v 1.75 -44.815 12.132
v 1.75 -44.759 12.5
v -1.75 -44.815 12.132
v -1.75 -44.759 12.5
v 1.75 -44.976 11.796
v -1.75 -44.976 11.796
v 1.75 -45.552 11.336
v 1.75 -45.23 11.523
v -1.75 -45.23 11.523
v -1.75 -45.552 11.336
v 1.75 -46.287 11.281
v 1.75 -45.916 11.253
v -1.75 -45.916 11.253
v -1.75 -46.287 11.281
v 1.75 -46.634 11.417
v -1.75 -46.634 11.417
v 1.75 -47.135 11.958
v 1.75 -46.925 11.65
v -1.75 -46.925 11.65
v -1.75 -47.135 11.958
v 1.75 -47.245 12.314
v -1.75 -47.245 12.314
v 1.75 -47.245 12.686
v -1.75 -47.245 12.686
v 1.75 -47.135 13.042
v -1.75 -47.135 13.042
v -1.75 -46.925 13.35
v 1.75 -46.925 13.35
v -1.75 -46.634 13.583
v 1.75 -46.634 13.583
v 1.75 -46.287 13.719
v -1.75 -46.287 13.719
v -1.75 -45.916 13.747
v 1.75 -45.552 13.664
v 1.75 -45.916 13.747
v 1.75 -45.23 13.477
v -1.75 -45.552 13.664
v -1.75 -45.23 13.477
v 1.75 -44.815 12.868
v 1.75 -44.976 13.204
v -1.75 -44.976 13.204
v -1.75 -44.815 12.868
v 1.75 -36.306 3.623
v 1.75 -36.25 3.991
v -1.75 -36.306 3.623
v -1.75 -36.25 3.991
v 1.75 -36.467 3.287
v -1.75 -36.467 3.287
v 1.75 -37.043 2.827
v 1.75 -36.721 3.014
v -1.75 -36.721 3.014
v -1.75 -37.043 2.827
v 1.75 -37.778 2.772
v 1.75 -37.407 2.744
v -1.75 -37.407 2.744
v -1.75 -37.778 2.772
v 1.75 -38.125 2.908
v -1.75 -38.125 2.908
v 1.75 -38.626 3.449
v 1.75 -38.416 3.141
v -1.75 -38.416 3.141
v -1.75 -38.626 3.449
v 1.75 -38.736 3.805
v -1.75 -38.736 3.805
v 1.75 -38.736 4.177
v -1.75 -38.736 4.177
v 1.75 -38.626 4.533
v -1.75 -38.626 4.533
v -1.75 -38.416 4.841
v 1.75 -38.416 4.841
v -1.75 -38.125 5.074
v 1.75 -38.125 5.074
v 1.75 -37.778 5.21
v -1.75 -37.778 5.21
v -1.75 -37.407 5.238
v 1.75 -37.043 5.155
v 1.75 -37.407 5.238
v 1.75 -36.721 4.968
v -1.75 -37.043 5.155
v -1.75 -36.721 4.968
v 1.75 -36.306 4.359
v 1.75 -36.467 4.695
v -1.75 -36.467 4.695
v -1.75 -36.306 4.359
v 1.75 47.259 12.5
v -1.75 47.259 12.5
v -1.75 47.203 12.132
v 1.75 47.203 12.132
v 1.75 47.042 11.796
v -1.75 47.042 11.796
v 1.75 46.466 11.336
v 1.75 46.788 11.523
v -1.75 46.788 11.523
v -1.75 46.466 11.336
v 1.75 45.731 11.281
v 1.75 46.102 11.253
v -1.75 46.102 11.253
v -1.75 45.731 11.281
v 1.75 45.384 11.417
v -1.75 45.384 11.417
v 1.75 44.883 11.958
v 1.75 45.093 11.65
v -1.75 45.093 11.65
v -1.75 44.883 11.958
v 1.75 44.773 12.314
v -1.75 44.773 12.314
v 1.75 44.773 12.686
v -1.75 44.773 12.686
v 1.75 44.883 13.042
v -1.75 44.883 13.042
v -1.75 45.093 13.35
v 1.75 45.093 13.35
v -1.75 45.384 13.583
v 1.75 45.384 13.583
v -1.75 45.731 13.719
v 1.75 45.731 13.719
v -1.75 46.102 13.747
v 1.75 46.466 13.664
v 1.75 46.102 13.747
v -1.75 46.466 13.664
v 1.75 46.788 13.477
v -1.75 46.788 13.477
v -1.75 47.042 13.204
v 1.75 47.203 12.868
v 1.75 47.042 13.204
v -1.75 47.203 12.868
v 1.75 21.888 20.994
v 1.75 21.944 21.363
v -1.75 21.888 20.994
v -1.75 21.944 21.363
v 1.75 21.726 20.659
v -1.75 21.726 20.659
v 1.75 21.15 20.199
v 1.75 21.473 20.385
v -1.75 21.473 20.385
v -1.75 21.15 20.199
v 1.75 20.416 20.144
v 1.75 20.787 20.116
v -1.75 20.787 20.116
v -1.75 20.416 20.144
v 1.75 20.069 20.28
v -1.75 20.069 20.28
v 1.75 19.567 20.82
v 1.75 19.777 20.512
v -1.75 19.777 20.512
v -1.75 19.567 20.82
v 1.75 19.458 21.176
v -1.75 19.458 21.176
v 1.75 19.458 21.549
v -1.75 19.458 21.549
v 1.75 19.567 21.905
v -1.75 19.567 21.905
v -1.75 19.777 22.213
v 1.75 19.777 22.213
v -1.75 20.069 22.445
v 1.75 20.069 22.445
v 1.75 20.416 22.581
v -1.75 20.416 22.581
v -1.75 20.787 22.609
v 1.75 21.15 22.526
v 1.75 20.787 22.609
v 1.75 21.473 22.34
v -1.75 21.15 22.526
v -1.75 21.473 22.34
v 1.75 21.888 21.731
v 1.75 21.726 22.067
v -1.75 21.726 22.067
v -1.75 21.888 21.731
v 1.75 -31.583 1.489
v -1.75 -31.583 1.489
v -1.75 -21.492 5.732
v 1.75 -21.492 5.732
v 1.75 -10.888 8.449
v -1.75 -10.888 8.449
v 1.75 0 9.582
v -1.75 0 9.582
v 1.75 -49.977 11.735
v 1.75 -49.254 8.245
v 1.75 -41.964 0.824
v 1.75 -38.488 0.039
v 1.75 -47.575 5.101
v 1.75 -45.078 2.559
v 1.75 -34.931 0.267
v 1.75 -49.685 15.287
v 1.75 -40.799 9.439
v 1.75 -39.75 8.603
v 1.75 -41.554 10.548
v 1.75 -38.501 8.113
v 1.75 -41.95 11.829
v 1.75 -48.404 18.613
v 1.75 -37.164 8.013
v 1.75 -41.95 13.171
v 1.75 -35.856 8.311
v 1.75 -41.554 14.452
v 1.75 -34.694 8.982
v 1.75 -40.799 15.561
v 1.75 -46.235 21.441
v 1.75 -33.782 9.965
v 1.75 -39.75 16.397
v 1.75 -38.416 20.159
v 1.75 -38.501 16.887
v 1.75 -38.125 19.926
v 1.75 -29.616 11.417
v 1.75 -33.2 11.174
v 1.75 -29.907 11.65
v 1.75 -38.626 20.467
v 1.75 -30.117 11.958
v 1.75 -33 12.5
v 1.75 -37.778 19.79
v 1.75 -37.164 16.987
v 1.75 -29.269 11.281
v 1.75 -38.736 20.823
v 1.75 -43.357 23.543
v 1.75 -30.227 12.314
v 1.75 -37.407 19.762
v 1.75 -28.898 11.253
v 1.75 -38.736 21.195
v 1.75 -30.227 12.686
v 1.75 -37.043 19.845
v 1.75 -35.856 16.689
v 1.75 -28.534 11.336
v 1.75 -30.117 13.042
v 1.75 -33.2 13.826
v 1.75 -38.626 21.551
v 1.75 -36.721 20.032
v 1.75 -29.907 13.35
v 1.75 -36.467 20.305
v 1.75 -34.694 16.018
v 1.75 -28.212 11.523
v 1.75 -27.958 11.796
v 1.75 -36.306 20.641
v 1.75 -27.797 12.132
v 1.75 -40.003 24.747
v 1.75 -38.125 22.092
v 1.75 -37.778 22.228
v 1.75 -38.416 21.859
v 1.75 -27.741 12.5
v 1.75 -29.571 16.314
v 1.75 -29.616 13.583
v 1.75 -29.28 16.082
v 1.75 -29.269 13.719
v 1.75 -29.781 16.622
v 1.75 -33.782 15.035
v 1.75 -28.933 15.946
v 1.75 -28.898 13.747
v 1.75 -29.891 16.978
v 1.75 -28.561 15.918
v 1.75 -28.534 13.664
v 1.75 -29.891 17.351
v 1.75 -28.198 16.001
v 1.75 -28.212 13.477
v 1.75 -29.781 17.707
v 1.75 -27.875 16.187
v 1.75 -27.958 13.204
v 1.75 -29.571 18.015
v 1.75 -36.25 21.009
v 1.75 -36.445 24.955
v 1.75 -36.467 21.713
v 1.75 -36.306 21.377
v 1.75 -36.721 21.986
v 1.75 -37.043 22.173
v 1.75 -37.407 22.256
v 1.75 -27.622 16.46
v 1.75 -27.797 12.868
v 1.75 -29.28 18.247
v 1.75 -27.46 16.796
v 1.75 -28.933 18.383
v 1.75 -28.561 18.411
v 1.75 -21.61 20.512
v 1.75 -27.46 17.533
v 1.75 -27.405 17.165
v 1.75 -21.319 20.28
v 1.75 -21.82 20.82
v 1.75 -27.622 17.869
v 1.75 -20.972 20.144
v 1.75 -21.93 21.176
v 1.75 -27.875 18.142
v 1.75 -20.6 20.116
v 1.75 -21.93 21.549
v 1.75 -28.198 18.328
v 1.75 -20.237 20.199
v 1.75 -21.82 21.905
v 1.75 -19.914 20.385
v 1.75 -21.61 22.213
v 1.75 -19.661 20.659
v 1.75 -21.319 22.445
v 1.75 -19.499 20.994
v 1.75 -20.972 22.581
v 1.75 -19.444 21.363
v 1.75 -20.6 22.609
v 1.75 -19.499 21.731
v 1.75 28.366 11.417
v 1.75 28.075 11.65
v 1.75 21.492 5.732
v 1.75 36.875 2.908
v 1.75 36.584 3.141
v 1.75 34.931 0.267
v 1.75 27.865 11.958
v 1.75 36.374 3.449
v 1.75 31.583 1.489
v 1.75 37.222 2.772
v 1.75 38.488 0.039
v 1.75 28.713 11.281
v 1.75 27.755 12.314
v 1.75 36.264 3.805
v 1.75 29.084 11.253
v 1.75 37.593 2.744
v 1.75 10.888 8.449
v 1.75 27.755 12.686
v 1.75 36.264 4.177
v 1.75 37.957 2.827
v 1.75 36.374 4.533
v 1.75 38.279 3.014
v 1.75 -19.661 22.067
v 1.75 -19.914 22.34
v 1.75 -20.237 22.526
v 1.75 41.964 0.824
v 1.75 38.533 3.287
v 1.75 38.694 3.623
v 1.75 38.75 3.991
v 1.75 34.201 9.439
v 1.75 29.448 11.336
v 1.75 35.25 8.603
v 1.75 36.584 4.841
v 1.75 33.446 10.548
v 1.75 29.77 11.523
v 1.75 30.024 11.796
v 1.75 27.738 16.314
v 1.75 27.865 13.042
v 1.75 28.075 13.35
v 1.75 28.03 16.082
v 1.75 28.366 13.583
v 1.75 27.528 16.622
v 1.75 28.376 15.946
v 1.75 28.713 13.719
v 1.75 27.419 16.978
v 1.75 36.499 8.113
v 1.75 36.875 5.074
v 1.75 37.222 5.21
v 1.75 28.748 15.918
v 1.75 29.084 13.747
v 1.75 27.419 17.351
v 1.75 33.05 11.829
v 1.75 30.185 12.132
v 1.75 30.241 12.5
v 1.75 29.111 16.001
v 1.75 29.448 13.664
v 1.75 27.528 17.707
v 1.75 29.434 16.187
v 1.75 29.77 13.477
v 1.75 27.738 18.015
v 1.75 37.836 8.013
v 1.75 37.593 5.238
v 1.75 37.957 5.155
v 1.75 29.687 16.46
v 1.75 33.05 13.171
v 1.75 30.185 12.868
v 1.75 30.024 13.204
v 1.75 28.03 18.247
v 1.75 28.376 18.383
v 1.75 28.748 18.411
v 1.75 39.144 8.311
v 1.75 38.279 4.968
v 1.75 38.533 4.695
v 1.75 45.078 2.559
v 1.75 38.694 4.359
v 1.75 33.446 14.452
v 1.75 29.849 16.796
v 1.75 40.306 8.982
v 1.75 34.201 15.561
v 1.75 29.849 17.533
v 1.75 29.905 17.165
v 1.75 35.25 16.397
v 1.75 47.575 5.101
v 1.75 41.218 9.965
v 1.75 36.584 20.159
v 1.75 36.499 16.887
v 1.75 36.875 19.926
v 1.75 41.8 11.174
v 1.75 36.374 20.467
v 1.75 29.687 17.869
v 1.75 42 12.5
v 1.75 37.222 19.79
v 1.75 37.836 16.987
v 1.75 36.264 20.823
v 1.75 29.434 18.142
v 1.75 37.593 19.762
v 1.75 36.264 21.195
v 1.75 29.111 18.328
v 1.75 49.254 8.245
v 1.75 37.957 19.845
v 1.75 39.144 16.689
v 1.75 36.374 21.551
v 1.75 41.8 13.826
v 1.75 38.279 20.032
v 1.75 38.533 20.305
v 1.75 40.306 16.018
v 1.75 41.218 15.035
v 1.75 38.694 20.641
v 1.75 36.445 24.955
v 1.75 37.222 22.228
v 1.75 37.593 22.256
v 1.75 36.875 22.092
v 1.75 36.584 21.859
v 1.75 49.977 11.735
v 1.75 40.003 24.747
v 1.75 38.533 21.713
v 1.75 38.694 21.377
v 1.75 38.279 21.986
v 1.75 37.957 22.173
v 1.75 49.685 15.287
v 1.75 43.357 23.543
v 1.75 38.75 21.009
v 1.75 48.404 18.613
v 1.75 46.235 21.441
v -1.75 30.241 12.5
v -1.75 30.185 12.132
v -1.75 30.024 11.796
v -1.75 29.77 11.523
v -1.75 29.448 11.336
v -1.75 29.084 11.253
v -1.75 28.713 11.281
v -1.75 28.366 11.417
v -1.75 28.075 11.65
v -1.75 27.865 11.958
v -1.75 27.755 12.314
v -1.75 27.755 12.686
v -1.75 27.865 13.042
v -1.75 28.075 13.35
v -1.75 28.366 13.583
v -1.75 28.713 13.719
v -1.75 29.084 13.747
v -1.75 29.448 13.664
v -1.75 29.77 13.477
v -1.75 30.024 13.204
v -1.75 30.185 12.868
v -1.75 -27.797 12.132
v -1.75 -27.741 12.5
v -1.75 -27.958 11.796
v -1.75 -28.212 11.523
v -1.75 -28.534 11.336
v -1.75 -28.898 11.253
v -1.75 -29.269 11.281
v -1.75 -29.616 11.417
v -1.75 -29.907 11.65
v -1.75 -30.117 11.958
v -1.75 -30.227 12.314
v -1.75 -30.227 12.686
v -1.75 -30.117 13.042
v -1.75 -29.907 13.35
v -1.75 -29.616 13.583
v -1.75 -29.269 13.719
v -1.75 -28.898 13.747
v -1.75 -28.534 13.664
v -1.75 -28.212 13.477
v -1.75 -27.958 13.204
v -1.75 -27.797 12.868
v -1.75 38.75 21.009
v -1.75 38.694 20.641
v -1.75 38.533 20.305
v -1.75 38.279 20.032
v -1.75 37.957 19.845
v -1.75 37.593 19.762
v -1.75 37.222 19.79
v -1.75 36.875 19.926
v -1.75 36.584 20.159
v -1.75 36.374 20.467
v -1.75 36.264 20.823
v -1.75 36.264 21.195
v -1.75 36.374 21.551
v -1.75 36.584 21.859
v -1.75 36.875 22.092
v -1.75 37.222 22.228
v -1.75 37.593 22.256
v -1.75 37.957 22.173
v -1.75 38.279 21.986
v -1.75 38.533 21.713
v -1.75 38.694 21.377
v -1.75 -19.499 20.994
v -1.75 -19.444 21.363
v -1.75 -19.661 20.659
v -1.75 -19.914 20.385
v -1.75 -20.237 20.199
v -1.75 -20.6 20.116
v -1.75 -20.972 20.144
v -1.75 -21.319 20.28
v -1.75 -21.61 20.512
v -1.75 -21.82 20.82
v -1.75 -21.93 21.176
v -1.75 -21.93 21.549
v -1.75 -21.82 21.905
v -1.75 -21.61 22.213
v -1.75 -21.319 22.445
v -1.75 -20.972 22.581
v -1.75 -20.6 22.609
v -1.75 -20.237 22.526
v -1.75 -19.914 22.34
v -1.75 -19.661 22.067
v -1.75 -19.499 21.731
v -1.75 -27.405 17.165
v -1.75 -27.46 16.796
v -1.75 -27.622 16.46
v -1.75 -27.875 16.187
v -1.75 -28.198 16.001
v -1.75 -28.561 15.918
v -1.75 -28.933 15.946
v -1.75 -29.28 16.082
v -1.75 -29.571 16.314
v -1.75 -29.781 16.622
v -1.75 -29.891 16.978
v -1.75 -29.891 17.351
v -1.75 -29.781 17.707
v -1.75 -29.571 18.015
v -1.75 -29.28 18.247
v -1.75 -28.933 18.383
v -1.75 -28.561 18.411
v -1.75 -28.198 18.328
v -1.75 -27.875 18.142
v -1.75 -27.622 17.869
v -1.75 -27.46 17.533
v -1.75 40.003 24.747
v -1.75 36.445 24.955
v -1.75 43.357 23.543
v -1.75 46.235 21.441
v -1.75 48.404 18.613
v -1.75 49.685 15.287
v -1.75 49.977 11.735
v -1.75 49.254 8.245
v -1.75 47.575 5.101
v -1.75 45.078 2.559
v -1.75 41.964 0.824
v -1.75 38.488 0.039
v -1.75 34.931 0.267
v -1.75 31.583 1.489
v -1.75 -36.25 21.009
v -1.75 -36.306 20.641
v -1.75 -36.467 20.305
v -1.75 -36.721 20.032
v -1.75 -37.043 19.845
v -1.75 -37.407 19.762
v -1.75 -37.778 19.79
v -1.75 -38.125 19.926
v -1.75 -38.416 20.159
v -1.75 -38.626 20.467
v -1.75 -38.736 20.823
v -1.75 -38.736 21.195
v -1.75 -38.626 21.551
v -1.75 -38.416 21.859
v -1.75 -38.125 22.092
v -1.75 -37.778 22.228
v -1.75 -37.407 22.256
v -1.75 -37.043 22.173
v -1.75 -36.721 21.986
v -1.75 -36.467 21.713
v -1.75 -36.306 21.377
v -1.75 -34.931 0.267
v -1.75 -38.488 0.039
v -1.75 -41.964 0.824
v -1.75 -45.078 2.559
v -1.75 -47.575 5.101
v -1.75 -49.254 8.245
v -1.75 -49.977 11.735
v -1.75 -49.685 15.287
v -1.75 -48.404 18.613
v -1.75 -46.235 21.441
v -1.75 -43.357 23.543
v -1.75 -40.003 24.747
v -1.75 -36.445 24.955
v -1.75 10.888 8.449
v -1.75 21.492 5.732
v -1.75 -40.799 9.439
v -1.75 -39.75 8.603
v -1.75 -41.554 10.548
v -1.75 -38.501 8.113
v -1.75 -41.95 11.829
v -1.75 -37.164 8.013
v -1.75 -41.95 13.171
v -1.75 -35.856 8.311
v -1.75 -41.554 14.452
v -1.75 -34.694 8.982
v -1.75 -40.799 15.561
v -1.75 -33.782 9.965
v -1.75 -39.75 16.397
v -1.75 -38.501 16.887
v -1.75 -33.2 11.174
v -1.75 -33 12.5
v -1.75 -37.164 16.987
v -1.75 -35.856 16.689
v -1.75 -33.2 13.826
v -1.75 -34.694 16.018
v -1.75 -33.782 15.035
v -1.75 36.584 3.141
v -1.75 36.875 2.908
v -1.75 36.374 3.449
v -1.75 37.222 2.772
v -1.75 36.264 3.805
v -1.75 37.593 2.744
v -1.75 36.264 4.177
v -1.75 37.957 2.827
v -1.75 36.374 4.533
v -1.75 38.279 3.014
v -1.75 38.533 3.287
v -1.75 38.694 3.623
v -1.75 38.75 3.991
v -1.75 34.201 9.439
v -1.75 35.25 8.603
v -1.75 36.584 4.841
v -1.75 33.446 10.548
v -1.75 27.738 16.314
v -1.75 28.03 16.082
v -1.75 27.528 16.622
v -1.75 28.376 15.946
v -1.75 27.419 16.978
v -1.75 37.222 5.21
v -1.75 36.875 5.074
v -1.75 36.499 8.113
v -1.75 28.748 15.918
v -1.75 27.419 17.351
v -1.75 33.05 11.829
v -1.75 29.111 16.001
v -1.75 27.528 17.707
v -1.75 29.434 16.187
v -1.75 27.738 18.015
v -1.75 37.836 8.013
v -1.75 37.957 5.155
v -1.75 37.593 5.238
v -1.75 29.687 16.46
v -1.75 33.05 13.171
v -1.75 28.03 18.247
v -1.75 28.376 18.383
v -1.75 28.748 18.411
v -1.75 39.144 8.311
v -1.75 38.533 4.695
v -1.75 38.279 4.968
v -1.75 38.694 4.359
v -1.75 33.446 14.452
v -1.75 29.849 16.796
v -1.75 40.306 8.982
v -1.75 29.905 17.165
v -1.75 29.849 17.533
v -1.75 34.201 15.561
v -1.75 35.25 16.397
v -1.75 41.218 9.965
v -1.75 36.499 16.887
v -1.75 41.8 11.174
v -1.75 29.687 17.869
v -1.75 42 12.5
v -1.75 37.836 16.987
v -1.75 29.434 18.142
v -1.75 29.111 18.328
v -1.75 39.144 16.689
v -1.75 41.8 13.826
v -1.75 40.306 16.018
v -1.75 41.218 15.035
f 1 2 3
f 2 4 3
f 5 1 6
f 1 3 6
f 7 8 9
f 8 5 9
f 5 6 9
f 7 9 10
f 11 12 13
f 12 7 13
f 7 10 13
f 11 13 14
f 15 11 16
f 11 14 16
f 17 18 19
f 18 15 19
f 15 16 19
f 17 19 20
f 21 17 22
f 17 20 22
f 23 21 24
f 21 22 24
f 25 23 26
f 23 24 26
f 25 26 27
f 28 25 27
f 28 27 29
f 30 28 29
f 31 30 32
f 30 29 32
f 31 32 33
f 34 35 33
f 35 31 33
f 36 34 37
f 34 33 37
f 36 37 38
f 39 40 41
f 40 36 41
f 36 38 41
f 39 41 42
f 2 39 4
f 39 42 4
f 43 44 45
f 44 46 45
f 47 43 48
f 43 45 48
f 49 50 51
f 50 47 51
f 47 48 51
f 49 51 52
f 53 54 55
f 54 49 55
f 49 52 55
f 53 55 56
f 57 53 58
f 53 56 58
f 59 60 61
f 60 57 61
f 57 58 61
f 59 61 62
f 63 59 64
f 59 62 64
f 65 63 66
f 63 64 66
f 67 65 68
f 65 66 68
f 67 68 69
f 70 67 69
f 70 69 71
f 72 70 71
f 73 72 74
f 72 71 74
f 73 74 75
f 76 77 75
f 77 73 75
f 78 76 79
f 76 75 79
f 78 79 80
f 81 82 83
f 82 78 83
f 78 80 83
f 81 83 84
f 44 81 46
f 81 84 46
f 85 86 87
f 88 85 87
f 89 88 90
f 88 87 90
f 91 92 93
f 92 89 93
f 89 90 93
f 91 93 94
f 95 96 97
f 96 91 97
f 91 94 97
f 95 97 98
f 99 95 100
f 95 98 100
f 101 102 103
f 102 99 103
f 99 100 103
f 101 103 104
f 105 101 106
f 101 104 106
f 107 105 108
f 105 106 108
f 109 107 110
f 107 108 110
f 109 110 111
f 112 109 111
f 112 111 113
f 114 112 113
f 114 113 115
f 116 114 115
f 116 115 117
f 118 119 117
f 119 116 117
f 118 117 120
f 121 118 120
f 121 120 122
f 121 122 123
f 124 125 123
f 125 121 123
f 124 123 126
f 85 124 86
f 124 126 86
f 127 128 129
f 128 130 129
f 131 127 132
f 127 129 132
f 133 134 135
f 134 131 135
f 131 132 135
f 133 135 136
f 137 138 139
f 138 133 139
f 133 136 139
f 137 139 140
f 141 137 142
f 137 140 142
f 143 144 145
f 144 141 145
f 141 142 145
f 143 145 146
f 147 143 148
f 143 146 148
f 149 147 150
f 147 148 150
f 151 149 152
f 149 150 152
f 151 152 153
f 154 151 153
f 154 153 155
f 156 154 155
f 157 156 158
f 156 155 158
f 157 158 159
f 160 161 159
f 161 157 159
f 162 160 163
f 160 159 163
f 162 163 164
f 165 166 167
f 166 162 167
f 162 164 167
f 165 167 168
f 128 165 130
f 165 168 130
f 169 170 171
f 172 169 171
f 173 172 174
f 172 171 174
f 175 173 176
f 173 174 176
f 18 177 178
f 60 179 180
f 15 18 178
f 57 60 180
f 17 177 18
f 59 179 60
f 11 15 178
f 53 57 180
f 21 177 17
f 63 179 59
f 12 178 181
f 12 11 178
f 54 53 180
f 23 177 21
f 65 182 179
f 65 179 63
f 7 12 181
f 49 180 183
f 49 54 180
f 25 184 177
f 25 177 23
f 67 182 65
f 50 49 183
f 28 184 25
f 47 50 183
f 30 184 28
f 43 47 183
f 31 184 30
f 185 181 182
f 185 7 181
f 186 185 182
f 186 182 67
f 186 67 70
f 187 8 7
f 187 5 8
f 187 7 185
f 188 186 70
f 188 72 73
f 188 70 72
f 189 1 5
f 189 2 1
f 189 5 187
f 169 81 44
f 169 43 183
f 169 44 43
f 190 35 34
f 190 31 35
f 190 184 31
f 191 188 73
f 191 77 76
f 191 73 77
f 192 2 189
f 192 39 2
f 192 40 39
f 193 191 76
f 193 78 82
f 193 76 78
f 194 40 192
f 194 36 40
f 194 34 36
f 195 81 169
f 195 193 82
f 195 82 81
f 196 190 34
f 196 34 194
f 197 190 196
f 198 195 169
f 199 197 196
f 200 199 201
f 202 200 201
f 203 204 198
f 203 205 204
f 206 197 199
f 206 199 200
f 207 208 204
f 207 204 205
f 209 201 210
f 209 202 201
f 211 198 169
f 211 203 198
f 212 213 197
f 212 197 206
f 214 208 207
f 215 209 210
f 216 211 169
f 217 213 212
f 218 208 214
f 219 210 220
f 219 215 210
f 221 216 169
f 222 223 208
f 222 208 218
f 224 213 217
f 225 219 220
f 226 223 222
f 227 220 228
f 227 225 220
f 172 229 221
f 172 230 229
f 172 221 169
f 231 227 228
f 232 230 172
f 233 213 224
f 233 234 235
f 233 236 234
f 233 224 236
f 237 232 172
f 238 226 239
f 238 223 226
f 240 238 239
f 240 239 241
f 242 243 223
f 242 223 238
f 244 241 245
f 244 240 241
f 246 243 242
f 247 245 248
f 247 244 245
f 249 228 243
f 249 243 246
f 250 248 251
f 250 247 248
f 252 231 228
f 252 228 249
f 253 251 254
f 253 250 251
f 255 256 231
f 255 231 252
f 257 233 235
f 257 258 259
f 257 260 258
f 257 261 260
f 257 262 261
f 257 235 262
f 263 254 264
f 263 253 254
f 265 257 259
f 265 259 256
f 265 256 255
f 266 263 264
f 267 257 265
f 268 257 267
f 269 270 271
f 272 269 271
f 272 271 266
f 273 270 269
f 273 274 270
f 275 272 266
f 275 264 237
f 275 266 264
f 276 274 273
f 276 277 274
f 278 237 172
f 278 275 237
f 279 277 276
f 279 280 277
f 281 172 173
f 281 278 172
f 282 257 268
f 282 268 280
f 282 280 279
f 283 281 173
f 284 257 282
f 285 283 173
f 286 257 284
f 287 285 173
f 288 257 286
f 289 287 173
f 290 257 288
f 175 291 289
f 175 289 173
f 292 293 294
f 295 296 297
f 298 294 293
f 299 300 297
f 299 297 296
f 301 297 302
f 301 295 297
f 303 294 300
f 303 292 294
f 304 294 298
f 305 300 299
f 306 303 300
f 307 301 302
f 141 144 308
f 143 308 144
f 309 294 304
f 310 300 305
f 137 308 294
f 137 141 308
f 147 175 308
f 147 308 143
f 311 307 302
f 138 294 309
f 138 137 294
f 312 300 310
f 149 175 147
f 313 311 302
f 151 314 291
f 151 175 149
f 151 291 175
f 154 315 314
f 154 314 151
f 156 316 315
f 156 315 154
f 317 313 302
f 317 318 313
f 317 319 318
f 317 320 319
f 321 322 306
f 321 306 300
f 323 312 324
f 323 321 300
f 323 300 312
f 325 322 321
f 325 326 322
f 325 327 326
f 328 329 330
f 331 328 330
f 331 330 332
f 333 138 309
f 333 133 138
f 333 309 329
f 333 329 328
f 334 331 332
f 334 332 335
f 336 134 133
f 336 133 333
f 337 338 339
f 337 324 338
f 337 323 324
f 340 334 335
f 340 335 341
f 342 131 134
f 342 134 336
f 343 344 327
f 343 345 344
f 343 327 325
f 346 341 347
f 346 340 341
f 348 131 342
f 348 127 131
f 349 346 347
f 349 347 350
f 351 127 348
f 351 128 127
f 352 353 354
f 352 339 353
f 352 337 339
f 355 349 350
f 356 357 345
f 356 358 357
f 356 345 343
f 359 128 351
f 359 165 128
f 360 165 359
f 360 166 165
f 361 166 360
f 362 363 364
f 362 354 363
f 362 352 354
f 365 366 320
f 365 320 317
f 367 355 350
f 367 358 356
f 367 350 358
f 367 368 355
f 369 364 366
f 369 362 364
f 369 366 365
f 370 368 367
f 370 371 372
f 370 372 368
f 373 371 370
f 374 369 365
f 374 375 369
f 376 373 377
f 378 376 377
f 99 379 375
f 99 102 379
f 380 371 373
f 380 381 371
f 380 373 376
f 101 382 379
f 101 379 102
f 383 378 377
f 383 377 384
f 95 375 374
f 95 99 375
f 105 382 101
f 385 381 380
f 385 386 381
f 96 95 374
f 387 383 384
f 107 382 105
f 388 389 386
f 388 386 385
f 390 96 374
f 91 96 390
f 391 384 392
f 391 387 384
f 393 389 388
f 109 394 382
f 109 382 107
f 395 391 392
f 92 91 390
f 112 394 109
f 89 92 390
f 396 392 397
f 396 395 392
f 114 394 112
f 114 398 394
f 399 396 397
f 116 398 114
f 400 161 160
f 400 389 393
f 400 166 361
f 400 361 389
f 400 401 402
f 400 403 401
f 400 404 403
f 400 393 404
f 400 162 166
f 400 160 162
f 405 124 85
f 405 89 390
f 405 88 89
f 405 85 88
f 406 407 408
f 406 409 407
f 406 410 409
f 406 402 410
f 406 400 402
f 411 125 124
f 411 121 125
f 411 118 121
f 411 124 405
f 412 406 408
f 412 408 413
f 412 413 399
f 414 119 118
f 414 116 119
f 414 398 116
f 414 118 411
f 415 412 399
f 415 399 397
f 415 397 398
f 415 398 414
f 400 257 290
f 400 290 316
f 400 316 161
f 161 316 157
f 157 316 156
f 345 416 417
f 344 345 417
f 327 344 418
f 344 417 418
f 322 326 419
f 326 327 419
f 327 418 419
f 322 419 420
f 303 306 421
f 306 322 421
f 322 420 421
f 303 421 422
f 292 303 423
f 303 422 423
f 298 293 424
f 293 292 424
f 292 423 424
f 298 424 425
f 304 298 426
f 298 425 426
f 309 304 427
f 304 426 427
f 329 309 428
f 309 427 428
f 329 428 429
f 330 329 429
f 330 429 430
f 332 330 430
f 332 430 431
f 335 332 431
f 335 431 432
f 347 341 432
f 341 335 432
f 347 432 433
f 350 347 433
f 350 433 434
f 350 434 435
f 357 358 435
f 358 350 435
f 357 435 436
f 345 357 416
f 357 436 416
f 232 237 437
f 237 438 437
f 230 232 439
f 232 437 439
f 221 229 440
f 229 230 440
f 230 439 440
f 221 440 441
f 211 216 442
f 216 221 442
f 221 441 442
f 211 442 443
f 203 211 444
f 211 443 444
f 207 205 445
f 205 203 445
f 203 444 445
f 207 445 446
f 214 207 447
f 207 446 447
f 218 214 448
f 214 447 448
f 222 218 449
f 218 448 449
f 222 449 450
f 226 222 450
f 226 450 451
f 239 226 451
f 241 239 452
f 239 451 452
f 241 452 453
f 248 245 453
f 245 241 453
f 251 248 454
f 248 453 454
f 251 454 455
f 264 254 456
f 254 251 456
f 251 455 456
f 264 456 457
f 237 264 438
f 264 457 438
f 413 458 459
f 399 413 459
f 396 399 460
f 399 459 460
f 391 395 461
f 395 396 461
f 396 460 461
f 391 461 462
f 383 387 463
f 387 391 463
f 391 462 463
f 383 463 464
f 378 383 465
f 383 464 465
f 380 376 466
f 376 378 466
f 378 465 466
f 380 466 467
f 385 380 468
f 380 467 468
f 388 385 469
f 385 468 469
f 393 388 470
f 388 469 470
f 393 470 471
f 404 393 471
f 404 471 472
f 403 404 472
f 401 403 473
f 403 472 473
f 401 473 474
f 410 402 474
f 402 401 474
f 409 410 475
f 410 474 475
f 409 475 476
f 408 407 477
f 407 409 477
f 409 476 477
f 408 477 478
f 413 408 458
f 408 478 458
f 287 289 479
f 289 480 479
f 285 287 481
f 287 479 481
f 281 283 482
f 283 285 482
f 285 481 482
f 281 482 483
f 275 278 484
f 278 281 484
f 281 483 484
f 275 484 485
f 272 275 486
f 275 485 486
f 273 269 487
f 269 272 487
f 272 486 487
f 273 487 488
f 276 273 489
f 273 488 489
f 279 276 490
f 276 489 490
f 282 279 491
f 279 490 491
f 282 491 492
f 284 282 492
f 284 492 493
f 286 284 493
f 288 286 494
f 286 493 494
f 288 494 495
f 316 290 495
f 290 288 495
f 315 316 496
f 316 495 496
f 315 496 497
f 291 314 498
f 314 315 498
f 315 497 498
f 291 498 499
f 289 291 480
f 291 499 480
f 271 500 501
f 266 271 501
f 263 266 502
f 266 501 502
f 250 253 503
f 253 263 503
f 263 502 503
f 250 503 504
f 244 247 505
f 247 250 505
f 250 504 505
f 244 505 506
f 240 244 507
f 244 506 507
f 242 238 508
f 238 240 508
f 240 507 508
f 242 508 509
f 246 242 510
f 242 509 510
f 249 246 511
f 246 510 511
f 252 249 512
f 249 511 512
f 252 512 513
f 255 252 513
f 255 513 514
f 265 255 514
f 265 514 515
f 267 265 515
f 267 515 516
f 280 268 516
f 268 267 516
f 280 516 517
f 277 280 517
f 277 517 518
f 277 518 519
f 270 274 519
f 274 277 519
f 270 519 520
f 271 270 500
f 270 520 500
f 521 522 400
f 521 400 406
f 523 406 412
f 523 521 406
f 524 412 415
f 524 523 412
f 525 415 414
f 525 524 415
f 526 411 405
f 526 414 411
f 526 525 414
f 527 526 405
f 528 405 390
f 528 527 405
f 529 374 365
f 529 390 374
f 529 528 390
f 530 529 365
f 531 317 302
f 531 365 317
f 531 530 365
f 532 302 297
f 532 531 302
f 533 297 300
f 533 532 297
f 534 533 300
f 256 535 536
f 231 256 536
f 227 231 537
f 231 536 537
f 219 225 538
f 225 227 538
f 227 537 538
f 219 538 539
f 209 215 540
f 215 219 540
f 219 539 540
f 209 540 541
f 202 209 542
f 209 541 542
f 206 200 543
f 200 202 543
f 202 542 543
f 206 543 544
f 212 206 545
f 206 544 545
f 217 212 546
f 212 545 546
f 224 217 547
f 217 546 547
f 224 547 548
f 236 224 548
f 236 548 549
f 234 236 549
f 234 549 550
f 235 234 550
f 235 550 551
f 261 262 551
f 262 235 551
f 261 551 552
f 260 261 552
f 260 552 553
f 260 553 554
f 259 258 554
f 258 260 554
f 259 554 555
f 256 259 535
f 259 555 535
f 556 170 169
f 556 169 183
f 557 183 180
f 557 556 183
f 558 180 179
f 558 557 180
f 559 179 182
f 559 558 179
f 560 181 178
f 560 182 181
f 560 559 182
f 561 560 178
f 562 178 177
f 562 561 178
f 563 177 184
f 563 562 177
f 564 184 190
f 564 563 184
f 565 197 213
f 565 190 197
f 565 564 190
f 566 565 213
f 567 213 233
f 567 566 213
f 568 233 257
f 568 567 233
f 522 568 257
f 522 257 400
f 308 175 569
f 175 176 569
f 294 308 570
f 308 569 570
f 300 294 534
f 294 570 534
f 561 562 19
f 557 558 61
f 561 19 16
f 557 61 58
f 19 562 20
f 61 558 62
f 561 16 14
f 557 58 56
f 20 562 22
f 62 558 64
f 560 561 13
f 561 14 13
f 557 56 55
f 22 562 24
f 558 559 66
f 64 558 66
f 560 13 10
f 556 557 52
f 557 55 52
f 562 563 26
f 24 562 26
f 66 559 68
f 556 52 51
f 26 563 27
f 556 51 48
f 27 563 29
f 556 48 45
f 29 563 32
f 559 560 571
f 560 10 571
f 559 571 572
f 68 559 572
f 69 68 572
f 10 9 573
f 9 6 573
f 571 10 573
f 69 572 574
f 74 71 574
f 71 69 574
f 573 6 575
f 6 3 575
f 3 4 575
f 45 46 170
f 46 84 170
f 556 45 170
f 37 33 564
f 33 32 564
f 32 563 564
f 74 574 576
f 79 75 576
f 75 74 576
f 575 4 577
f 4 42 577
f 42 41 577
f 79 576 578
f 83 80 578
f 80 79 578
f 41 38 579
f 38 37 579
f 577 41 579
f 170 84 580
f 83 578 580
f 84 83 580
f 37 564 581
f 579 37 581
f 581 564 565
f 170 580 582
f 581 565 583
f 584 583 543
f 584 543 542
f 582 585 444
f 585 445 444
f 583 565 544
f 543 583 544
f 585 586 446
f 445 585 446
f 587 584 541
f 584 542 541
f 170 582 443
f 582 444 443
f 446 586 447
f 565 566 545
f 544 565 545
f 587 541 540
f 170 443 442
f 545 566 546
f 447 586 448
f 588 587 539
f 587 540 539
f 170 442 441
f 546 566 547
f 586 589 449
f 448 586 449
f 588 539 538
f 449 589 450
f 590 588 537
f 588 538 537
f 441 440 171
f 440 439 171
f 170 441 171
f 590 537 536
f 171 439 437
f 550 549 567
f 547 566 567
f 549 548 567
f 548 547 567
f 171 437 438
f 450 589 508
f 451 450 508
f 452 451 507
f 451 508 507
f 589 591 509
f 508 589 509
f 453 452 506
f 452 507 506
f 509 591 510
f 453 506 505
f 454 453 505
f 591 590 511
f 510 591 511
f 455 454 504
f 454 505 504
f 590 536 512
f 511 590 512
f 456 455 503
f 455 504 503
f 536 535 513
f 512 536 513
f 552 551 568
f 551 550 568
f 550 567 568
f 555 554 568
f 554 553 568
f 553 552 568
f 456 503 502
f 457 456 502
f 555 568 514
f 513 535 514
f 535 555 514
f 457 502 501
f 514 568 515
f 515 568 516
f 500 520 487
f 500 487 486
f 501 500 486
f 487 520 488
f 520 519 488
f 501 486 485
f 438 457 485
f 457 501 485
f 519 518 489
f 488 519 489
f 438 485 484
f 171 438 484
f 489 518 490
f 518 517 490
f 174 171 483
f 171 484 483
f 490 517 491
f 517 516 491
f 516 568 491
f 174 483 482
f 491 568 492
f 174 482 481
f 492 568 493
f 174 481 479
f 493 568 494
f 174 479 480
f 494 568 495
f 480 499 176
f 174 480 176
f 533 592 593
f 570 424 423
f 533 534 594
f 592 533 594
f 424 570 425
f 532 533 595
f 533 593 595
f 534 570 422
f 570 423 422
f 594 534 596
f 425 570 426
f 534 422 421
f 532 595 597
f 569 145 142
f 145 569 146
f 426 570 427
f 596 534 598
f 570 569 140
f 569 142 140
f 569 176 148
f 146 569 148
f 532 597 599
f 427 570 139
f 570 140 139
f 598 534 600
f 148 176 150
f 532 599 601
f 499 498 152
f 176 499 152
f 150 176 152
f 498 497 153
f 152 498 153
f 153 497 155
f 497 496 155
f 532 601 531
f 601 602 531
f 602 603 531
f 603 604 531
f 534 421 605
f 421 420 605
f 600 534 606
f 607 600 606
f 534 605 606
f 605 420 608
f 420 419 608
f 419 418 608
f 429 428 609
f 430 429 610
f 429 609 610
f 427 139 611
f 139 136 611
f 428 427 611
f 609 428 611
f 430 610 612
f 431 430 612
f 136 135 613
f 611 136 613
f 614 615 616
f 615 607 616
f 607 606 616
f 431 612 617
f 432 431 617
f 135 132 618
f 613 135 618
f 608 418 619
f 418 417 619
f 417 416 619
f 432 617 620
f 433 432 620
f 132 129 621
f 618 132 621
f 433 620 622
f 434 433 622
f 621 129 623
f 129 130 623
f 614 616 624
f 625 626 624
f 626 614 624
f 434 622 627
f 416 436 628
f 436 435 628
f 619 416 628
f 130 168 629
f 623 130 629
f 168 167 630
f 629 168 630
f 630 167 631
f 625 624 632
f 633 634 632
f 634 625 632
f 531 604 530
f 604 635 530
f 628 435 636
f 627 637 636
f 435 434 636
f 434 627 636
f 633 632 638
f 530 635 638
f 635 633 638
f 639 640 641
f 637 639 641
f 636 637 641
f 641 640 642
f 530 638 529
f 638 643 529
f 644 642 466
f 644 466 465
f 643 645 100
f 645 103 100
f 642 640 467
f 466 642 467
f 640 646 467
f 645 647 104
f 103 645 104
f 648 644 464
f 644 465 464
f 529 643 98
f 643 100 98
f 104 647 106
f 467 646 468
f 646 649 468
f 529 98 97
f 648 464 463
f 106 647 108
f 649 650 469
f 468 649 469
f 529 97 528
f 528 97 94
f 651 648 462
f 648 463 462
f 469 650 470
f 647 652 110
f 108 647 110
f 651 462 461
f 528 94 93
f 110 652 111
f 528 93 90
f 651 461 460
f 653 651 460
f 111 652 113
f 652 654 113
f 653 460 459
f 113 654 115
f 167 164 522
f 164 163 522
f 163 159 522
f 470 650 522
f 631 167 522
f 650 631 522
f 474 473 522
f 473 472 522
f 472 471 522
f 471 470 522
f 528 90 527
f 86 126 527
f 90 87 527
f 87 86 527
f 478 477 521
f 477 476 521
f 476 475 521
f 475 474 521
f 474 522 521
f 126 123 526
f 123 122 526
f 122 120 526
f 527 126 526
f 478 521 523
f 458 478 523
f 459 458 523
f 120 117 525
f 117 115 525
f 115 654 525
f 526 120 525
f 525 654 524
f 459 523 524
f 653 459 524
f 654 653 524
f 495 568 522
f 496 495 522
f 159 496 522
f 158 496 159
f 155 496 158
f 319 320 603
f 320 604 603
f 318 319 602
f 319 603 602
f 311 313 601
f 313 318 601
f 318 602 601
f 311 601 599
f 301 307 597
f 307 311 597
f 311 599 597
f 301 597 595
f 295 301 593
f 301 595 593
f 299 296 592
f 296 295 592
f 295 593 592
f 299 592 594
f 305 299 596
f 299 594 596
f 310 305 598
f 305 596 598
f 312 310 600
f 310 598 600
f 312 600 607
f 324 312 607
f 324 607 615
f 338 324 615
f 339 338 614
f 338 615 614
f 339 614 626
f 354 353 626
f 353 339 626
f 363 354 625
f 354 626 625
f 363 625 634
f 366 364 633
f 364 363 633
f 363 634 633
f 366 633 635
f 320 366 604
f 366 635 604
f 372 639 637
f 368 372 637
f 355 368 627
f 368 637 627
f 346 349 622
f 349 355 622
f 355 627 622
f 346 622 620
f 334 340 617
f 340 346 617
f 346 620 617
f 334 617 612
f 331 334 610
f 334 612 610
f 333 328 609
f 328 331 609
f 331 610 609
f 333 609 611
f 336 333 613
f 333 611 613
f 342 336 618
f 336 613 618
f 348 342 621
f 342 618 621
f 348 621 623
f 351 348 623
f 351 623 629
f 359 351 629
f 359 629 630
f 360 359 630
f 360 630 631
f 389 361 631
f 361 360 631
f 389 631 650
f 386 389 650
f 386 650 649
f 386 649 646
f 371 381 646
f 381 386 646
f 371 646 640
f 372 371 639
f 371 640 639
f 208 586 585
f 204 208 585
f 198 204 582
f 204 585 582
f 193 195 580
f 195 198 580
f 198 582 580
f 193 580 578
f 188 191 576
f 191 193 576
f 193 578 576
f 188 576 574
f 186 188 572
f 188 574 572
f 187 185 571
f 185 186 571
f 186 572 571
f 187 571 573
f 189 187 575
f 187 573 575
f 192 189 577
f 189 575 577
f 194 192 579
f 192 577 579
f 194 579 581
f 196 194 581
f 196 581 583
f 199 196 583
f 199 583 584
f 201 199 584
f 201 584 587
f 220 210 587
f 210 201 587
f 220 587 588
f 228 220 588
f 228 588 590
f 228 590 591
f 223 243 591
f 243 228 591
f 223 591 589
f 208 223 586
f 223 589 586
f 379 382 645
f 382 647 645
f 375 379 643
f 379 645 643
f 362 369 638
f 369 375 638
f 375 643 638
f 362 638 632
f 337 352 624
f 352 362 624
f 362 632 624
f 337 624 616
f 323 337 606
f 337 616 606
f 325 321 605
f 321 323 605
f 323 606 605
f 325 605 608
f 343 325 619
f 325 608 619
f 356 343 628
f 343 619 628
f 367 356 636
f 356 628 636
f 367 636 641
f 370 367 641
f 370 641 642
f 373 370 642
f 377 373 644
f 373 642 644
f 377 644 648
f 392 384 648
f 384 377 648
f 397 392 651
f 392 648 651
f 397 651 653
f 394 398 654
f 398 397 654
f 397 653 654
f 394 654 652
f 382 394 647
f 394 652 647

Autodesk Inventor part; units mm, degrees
ref_plane "YZ Plane" through (0, 0, 0) normal (1, 0, 0) x (0, 1, 0)
ref_plane "XZ Plane" through (0, 0, 0) normal (0, 1, 0) x (-1, 0, 0)
ref_plane "XY Plane" through (0, 0, 0) normal (0, 0, 1) x (1, 0, 0)
sketch "Sketch1" plane through (0, 0, 0) normal (1, 0, 0) x (0, 1, 0)
  line L0 (0, 24.9554) -> (36.4449, 24.9554)
  arc A0 (31.5833, 1.489) -> (36.4449, 24.9554) centre (37.5, 12.5) ccw
  arc A1 (31.7956, 1.3803) -> (0, 9.582) centre (-2.2398, -64.8326) ccw
  circle A2 centre (37.5, 3.991) radius 1.25
  circle A3 centre (28.991, 12.5) radius 1.25
  circle A4 centre (37.5, 21.009) radius 1.25
  circle A5 centre (46.009, 12.5) radius 1.25
  circle A6 centre (28.6546, 17.1646) radius 1.25
  circle A7 centre (20.6937, 21.3627) radius 1.25
  circle A8 centre (37.5, 12.5) radius 4.5
  line L1 (-2.2398, 24.9554) -> (-2.25, 24.9554)
  arc A9 (-2.2398, 9.6157) -> (-2.25, 9.6157) centre (-2.2398, -64.8326) ccw
  arc A10 (0, 9.582) -> (-31.7956, 1.3803) centre (2.2398, -64.8326) ccw
  line L2 (0, 24.9554) -> (-36.4449, 24.9554)
  arc A11 (-36.4449, 24.9554) -> (-31.5833, 1.489) centre (-37.5, 12.5) ccw
  circle A12 centre (-37.5, 3.991) radius 1.25
  circle A13 centre (-28.991, 12.5) radius 1.25
  circle A14 centre (-37.5, 21.009) radius 1.25
  circle A15 centre (-46.009, 12.5) radius 1.25
  circle A16 centre (-28.6546, 17.1646) radius 1.25
  circle A17 centre (-20.6937, 21.3627) radius 1.25
  circle A18 centre (-37.5, 12.5) radius 4.5
  line L3 (2.2398, 24.9554) -> (2.25, 24.9554)
  arc A19 (2.25, 9.6157) -> (2.2398, 9.6157) centre (2.2398, -64.8326) ccw
  point P0 (0.0204, 0)
  point P1 (-0.0204, 0)
  dimension "d47" = 8.509
  dimension "d48" = 8.509
  dimension "d49" = 8.509
  dimension "d50" = 8.509
  dimension "d51" = 10
  dimension "d53" = 9
  dimension "d56" = 9
  dimension "d58" = 4.1981
  dimension "d61" = 75
extrude "Extrusion3" add sketch "Sketch1" along normal mid plane 3.5
properties part number "tibia extrude"
